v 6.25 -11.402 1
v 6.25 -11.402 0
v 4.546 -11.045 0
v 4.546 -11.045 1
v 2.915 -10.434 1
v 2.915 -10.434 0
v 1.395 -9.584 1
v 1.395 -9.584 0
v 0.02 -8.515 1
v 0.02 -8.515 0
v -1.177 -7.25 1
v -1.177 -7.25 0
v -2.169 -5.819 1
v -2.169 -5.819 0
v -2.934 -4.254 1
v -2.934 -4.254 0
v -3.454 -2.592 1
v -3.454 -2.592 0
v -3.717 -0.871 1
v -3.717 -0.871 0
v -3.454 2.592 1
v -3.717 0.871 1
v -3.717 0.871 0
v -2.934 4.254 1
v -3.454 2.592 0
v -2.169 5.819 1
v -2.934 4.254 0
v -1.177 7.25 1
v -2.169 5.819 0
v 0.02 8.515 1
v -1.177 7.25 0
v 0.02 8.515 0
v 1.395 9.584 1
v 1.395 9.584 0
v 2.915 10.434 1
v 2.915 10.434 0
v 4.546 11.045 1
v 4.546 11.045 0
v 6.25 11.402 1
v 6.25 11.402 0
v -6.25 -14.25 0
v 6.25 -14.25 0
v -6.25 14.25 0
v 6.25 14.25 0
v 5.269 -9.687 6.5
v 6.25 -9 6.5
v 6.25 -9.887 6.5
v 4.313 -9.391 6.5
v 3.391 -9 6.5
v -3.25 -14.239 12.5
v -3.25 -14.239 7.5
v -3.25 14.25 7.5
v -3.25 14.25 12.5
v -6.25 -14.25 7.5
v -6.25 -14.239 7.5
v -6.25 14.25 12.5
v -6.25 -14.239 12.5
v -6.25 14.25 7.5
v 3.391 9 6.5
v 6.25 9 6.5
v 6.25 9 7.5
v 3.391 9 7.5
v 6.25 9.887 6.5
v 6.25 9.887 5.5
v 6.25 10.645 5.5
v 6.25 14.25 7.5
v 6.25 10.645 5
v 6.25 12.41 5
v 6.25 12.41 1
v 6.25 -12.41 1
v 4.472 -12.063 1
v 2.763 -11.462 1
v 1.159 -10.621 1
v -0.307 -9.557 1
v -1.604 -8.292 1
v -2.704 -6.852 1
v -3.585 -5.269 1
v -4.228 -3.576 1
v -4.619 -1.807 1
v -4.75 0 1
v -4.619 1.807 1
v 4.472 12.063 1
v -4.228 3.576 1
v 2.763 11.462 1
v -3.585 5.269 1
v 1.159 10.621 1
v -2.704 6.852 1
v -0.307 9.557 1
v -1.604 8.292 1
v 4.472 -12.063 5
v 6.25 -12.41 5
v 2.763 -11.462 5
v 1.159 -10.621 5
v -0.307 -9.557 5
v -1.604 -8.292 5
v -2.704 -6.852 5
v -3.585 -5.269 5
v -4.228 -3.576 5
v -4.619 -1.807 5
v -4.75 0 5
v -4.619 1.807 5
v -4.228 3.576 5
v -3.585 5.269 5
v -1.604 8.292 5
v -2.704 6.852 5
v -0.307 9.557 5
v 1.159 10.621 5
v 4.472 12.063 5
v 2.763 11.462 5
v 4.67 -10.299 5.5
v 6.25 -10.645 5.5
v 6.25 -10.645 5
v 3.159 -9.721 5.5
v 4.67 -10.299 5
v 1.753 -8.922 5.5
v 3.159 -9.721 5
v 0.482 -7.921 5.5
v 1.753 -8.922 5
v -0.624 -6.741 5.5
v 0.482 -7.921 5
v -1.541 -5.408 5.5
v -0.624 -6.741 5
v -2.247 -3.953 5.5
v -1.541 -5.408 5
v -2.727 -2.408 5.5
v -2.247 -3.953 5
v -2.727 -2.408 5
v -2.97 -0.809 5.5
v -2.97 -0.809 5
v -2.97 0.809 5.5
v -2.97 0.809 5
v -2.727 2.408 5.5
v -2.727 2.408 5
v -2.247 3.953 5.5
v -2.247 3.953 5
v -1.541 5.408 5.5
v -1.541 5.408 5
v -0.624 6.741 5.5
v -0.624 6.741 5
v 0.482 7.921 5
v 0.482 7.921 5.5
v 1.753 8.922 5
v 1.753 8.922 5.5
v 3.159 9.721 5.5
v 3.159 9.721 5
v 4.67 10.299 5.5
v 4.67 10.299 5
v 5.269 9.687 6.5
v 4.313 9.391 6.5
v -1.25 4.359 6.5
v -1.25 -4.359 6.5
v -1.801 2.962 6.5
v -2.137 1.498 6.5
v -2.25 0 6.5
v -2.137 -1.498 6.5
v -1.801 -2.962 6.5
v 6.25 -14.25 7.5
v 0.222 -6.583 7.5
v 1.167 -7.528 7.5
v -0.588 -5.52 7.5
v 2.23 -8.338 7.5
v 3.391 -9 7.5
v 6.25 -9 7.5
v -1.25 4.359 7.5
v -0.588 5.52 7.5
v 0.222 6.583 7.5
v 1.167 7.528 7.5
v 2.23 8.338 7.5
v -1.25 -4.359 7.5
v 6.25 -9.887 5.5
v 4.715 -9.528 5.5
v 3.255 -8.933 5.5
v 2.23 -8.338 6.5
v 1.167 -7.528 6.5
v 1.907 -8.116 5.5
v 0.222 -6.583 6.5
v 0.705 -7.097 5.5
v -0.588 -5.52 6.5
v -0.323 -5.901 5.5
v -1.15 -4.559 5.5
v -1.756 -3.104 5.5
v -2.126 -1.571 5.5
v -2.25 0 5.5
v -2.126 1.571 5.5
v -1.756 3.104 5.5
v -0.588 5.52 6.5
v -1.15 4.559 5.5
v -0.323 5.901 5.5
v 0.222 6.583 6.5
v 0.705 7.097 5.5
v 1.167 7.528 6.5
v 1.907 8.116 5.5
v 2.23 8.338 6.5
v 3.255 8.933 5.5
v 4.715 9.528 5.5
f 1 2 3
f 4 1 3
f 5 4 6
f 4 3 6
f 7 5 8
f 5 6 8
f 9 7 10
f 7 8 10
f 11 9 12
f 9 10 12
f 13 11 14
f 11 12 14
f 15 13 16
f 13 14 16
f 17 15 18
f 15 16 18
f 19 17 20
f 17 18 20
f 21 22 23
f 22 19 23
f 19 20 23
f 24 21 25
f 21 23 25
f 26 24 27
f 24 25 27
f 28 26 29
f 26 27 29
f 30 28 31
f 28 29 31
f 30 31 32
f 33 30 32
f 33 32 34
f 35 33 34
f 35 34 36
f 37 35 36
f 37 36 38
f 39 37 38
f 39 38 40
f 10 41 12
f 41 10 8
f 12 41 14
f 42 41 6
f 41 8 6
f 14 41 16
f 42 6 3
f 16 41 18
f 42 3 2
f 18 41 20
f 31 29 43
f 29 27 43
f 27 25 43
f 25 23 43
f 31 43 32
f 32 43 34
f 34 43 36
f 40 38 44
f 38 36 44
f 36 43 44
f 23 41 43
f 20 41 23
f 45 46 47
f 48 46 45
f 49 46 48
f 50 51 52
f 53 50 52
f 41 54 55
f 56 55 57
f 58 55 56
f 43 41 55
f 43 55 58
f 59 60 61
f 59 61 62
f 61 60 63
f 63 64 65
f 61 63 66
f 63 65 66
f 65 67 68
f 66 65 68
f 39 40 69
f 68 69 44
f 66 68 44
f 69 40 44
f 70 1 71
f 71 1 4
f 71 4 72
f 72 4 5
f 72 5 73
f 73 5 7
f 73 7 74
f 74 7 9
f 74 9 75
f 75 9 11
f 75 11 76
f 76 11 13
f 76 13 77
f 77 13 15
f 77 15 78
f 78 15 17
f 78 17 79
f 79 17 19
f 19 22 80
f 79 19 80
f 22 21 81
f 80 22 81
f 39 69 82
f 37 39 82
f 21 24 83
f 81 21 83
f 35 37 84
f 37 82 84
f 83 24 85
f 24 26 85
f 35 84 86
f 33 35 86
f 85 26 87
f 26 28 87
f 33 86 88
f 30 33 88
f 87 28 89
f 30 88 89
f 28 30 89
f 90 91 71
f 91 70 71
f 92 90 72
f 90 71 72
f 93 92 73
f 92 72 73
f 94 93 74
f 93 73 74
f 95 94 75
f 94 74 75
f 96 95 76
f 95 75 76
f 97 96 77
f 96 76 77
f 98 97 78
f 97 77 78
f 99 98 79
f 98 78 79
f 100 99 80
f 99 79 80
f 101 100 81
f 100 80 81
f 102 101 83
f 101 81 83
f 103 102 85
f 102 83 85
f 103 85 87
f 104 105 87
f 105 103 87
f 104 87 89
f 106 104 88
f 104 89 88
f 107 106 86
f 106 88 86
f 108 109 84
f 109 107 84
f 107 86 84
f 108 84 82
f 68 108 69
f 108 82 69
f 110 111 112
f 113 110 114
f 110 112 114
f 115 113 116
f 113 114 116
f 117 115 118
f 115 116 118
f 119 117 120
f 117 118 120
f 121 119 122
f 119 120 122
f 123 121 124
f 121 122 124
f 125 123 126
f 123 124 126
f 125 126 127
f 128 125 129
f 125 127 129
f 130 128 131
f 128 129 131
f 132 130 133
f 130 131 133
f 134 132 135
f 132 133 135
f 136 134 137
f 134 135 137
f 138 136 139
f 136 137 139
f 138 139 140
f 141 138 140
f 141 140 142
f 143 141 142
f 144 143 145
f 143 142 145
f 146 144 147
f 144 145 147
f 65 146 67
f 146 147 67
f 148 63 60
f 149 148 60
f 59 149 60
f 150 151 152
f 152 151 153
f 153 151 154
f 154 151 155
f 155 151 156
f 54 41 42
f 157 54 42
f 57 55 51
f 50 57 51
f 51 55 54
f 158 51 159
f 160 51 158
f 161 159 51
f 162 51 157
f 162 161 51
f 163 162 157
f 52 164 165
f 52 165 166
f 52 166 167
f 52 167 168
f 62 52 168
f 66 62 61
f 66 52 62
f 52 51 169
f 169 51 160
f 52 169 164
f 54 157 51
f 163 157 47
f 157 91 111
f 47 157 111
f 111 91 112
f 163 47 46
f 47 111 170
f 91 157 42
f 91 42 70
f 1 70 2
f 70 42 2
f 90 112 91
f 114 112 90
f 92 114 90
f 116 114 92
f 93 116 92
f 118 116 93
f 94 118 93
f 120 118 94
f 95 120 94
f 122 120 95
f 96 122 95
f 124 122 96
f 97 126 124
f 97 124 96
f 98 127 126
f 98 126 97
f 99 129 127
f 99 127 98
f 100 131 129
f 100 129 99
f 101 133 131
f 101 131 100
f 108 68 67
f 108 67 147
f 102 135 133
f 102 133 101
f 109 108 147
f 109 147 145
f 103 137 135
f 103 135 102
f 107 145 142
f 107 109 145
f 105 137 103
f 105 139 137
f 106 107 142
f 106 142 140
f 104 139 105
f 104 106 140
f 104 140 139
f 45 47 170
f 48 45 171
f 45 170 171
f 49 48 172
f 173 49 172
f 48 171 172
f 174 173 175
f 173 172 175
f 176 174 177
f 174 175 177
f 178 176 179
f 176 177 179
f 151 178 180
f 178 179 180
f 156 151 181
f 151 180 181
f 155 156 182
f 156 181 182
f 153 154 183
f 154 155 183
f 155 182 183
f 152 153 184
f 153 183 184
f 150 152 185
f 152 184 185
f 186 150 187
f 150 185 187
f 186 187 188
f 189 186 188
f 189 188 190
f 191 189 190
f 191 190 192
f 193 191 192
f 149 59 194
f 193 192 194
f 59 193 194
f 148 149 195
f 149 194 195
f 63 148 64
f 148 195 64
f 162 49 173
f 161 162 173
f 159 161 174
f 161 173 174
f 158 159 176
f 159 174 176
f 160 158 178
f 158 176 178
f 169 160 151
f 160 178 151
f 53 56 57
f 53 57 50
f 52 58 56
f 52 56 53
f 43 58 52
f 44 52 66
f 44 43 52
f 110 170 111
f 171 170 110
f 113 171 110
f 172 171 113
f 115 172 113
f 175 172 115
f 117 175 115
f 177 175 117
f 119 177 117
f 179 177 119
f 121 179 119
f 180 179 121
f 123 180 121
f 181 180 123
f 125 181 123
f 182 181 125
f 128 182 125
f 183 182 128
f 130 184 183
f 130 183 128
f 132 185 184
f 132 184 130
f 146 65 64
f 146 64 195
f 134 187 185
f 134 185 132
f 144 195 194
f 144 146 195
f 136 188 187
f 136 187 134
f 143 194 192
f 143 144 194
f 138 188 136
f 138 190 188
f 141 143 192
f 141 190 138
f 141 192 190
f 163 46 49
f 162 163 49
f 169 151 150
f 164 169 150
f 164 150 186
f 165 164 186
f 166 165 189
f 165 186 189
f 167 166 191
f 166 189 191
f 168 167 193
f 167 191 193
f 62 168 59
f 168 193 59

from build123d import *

# Parameters (mm, degrees)
SKETCH_1_W          = 12.5
SKETCH_1_H          = 28.5
EXTRUDE_1_DEPTH     = 7.5
SKETCH_2_W          = 3
SKETCH_2_H          = 28.488787575
EXTRUDE_2_DEPTH     = 5
SKETCH_3_R          = 11.5
CUT_EXTRUDE_1_DEPTH = 1
SKETCH_4_R          = 12.5
CUT_EXTRUDE_2_DEPTH = 4
SKETCH_5_R          = 10.75
CUT_EXTRUDE_3_DEPTH = 0.5
SKETCH_6_R          = 10
CUT_EXTRUDE_4_DEPTH = 1
SKETCH_7_W          = 18
SKETCH_7_H          = 18
CUT_EXTRUDE_5_DEPTH = 1
EXTRUDE_5_DEPTH     = 1


with BuildPart() as part:
    # 草图1 → 凸台-拉伸1 (new body)
    with BuildSketch(Plane.XY):
        Rectangle(SKETCH_1_W, SKETCH_1_H)
    extrude(amount=EXTRUDE_1_DEPTH)

    # 草图2 → 凸台-拉伸2 (add)
    with BuildSketch(Plane.XY.offset(7.5)):
        with Locations((-4.75, 0.005606212)):
            Rectangle(SKETCH_2_W, SKETCH_2_H)
    extrude(amount=EXTRUDE_2_DEPTH)

    # 草图3 → 切除-拉伸1 (cut)
    with BuildSketch(Plane(origin=(0, 0, 0), x_dir=(-1, 0, 0), z_dir=(0, 0, -1))):
        with Locations((-7.75, 0)):
            Circle(SKETCH_3_R)
    extrude(amount=-CUT_EXTRUDE_1_DEPTH, mode=Mode.SUBTRACT)

    # 草图4 → 切除-拉伸2 (cut)
    with BuildSketch(Plane(origin=(0, 0, 1), x_dir=(-1, 0, 0), z_dir=(0, 0, -1))):
        with Locations((-7.75, 0)):
            Circle(SKETCH_4_R)
    extrude(amount=-CUT_EXTRUDE_2_DEPTH, mode=Mode.SUBTRACT)

    # 草图5 → 切除-拉伸3 (cut)
    with BuildSketch(Plane(origin=(0, 0, 5), x_dir=(-1, 0, 0), z_dir=(0, 0, -1))):
        with Locations((-7.75, 0)):
            Circle(SKETCH_5_R)
    extrude(amount=-CUT_EXTRUDE_3_DEPTH, mode=Mode.SUBTRACT)

    # 草图6 → 切除-拉伸4 (cut)
    with BuildSketch(Plane(origin=(0, 0, 5.5), x_dir=(-1, 0, 0), z_dir=(0, 0, -1))):
        with Locations((-7.75, 0)):
            Circle(SKETCH_6_R)
    extrude(amount=-CUT_EXTRUDE_4_DEPTH, mode=Mode.SUBTRACT)

    # 草图7 → 切除-拉伸5 (cut)
    with BuildSketch(Plane(origin=(0, 0, 6.5), x_dir=(-1, 0, 0), z_dir=(0, 0, -1))):
        with Locations((-7.75, 0)):
            Rectangle(SKETCH_7_W, SKETCH_7_H)
    extrude(amount=-CUT_EXTRUDE_5_DEPTH, mode=Mode.SUBTRACT)

    # 草图9 → 凸台-拉伸5 (add)
    with BuildSketch(Plane.XY.offset(6.5)):
        with BuildLine():
            Line((3.391101056, 9), (-1.25, 9))
            Line((-1.25, 9), (-1.25, 4.358898944))
            ThreePointArc((-1.25, 4.358898944), (0.678932188, 7.071067812), (3.391101056, 9))
        make_face()
        with BuildLine():
            Line((-1.25, -4.358898944), (-1.25, -9))
            Line((-1.25, -9), (3.391101056, -9))
            ThreePointArc((3.391101056, -9), (0.678932188, -7.071067812), (-1.25, -4.358898944))
        make_face()
    extrude(amount=EXTRUDE_5_DEPTH)


solid = part.part
